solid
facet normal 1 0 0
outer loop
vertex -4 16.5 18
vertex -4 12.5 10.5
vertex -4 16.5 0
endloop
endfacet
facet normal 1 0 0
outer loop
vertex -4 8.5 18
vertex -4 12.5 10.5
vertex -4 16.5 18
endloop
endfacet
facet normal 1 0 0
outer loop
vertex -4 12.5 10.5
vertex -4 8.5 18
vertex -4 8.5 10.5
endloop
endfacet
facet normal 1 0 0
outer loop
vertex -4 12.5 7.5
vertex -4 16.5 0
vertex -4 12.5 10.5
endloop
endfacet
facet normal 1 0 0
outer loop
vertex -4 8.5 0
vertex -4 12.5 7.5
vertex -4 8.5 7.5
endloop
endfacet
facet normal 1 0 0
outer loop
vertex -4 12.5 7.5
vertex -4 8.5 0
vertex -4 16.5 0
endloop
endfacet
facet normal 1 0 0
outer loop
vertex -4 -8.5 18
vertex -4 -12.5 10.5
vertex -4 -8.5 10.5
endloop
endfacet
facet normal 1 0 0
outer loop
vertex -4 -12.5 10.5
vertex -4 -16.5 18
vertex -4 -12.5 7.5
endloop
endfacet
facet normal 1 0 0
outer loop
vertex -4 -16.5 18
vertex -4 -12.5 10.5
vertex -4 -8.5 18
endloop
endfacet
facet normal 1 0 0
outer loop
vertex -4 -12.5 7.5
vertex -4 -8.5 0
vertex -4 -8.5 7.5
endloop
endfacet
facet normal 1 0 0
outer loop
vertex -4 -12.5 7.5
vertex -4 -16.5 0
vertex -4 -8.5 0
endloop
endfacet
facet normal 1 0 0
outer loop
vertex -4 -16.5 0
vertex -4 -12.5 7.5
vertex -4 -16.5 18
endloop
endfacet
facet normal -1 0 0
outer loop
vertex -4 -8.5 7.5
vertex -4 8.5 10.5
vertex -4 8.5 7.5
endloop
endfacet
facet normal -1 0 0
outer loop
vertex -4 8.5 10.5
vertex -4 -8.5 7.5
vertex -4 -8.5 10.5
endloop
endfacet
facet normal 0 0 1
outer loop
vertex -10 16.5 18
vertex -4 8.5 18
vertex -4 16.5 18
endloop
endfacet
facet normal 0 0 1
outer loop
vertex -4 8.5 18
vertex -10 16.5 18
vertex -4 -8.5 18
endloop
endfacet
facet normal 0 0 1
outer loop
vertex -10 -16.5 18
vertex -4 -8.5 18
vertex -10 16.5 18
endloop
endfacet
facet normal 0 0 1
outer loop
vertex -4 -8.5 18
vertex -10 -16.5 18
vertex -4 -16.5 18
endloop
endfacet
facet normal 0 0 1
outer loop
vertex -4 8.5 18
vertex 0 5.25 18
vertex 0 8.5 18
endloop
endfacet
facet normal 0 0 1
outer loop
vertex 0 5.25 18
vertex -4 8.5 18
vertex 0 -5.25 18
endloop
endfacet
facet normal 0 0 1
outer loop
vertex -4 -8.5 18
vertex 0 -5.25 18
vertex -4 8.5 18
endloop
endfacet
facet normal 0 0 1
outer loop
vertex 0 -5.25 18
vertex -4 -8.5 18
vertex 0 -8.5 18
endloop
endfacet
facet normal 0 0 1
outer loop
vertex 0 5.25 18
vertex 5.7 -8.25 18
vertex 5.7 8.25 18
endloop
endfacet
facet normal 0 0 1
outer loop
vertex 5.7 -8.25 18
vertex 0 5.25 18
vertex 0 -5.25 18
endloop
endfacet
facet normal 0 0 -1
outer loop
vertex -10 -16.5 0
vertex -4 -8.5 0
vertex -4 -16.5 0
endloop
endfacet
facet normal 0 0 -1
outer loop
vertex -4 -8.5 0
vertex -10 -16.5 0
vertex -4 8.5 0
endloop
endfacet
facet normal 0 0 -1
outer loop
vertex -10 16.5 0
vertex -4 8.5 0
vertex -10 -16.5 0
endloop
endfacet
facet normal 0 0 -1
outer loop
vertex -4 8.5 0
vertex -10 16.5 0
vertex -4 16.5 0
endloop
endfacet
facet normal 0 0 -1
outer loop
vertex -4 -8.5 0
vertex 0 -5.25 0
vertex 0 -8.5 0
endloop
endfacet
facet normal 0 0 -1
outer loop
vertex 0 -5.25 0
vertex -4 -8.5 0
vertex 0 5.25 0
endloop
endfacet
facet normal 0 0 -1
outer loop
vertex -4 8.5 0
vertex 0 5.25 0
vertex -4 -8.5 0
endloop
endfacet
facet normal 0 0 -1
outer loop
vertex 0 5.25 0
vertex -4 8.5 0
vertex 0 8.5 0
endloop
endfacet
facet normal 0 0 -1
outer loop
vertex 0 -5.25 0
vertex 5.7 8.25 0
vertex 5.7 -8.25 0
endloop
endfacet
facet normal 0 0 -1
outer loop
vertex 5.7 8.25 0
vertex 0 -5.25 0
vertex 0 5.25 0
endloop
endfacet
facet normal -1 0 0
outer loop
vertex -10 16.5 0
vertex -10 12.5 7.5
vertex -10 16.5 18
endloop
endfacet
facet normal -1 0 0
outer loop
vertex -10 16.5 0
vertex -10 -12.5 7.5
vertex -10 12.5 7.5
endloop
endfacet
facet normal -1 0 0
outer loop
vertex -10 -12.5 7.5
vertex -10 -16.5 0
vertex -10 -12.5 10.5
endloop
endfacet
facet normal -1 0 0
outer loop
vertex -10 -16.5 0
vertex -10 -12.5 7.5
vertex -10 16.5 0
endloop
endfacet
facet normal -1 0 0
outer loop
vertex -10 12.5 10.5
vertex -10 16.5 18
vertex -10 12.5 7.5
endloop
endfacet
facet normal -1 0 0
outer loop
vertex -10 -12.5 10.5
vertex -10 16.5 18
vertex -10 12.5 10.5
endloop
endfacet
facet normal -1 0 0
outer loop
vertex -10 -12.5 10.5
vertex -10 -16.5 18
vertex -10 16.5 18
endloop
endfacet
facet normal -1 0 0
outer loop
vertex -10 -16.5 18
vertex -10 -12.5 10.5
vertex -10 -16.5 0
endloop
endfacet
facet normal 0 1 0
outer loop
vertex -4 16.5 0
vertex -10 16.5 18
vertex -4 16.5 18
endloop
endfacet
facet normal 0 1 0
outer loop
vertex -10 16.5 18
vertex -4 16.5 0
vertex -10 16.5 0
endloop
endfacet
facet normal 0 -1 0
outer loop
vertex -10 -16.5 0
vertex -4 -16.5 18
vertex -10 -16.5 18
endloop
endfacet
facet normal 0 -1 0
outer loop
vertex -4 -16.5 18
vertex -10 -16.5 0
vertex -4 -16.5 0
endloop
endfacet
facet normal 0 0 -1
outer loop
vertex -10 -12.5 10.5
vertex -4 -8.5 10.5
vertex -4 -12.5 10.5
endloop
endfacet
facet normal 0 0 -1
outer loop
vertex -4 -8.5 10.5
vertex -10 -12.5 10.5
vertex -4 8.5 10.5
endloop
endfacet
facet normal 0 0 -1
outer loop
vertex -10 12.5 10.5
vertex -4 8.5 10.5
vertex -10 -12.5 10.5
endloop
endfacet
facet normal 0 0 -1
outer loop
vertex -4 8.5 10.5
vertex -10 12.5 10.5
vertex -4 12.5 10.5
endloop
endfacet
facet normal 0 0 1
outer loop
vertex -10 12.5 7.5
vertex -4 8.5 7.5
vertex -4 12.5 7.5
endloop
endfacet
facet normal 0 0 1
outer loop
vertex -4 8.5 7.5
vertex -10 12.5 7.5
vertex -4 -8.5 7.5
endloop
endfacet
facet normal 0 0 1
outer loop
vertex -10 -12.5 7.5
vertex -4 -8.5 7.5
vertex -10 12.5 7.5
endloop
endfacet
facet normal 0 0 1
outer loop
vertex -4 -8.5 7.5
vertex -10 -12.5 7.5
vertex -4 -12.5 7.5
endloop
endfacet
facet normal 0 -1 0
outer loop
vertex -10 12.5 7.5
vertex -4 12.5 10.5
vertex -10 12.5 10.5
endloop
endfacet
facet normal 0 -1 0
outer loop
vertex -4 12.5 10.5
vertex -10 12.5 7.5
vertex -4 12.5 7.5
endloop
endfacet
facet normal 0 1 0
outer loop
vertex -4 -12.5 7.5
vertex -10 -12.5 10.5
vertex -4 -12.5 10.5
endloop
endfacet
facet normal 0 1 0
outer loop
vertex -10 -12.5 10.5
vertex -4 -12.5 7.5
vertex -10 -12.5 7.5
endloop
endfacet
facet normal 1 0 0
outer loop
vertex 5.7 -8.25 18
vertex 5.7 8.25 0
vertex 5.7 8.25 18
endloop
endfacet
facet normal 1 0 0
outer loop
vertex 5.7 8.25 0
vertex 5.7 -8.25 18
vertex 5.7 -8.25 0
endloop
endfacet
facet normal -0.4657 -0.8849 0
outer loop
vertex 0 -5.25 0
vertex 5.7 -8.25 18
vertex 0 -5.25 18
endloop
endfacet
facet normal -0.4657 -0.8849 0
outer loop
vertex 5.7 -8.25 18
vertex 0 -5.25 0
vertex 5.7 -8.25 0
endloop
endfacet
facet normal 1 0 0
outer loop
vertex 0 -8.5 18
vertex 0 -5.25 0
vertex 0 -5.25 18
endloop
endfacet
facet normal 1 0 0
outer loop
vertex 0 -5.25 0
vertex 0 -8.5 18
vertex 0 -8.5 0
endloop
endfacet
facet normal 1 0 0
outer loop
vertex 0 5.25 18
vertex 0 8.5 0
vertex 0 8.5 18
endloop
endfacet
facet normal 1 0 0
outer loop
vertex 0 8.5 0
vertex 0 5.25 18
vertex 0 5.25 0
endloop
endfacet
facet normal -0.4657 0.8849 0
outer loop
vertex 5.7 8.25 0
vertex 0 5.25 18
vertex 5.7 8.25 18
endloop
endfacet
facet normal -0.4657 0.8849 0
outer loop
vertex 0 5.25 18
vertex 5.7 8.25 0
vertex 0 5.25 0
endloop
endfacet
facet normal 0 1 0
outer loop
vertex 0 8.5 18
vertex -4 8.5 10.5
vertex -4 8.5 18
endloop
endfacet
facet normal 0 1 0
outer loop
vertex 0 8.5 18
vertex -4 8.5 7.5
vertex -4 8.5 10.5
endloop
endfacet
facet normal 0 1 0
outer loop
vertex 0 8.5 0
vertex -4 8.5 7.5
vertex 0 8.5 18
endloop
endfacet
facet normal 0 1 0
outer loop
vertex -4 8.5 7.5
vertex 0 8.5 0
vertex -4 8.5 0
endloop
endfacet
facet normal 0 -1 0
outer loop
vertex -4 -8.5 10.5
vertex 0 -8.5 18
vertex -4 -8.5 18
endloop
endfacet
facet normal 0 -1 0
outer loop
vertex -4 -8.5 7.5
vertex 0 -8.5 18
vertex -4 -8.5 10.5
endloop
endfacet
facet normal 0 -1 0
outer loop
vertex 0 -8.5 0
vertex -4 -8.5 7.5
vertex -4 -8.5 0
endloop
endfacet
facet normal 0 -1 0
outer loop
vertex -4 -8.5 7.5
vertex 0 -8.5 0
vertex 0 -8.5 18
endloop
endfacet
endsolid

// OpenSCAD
// file: stand_cable_clamp_common.scad
// stand_cable_clamp_common.scad — modular cable clamp for round stand poles.
//
// A split C-clamp pops over the pole and an M5 bolt + wingnut cinches it tight
// (the bolt head is captured in a hex pocket, so you only turn the wingnut —
// tool-free reposition). A dovetail on the clamp face takes slide-on cable
// heads, so one clamp accepts any attachment.
//
//   clamp(tube_d)   — the pole clamp (set tube_d to your pole OD)
//   head_hook()     — open J-hook
//   head_clip()     — snap cable clip
//   head_comb()     — multi-cable comb
//   head_velcro()   — velcro-strap slot
//
// On-Stage SS8800B+ upper shaft = 34.9 mm (1⅜") or 38.1 mm (1½" w/ sleeve).
// Measure the crank-up column for a wider variant.

TUBE_D = 35;        // pole outer diameter (set per stand)
CLEAR  = 0.6;       // clamp bore clearance
WALL   = 5;         // clamp wall
H      = 22;        // clamp height (along the pole)
GAP    = 4;         // split-gap width
EAR_L  = 18; EAR_W = 10;
BOLT_D = 5.4;       // M5 clearance
HEX_AF = 8.2;       // M5 hex head/nut across-flats (capture pocket)
HEX_T  = 4.5;

// dovetail (undercut: mouth narrower than back so the head can't pull out)
DT_MOUTH = 11; DT_BACK = 17; DT_DEPTH = 6; DT_H = 18; DT_STOP = 3; DT_CLEAR = 0.5;
CABLE_D = 8;        // nominal cable diameter for clip/comb

$fn = 64;

// dovetail solid: mouth (narrow) at x=0 facing -X, widening to back at x=depth, extruded up Z
module dt_prism(mouth, back, depth, h) {
    linear_extrude(h) polygon([[0, -mouth/2], [0, mouth/2], [depth, back/2], [depth, -back/2]]);
}
module dt_tongue() { dt_prism(DT_MOUTH - DT_CLEAR, DT_BACK - DT_CLEAR, DT_DEPTH - 0.3, DT_H); }

// ---- clamp ----
module clamp(tube_d = TUBE_D) {
    ir = tube_d / 2 + CLEAR; orr = ir + WALL;
    boss_x = -orr - DT_DEPTH - 2;        // -X outer face of the dovetail boss
    difference() {
        union() {
            cylinder(h = H, r = orr);
            translate([orr - 3, GAP / 2, 0]) cube([EAR_L, EAR_W, H]);            // +Y ear
            translate([orr - 3, -GAP / 2 - EAR_W, 0]) cube([EAR_L, EAR_W, H]);   // -Y ear
            translate([boss_x, -(DT_BACK / 2 + 4), 0]) cube([DT_DEPTH + 5, DT_BACK + 8, H]); // dovetail boss
        }
        translate([0, 0, 0]) cylinder(h = 3 * H, r = ir, center = true);         // bore
        translate([0, -GAP / 2, -1]) cube([orr + EAR_L + 5, GAP, H + 2]);        // split slot
        // wingnut bolt through the ears (along Y)
        translate([orr + EAR_L - 8, GAP / 2 + EAR_W + 3, H / 2]) rotate([90, 0, 0]) cylinder(h = 2 * EAR_W + GAP + 8, d = BOLT_D);
        // hex pocket captures the bolt head on the +Y ear outer face
        translate([orr + EAR_L - 8, GAP / 2 + EAR_W + HEX_T, H / 2]) rotate([90, 0, 0]) cylinder(h = HEX_T + 1, d = HEX_AF / cos(30), $fn = 6);
        // dovetail socket groove (open top, solid below DT_STOP as a slide stop)
        translate([boss_x, 0, DT_STOP]) dt_prism(DT_MOUTH, DT_BACK, DT_DEPTH, H);
    }
}

// ---- heads (universal; mount via the dovetail tongue at x=0..DT_DEPTH) ----
module _backplate(t = 4) { translate([-t, -DT_BACK / 2, 0]) cube([t, DT_BACK, DT_H]); }

module head_hook() {
    dt_tongue(); _backplate();
    translate([-4, 0, DT_H / 2]) rotate([90, 0, 0])
        rotate_extrude(angle = 250) translate([16, 0]) circle(d = 7);
}
module head_clip(clip_w = 12) {
    dt_tongue(); _backplate();
    // C-clip (vertical cable), ring connects to the backplate on +X, mouth opens -X
    ring_out = CABLE_D + 5;
    translate([-4 - ring_out / 2 + 1.5, 0, (DT_H - clip_w) / 2])
        linear_extrude(clip_w) difference() {
            circle(d = ring_out);
            circle(d = CABLE_D + 0.7);
            translate([-ring_out, -(CABLE_D - 1.5) / 2]) square([ring_out, CABLE_D - 1.5]); // snap mouth (-X)
        }
}
module head_comb(n = 4) {
    dt_tongue(); _backplate();
    bar_w = n * (CABLE_D + 3) + 3;
    translate([-4 - 8, -bar_w / 2, 0]) difference() {
        cube([10, bar_w, DT_H]);
        for (i = [0 : n - 1]) translate([-1, 3 + i * (CABLE_D + 3) + CABLE_D / 2, DT_H]) rotate([0, 90, 0]) cylinder(d = CABLE_D, h = 12); // open-top slots
        for (i = [0 : n - 1]) translate([-1, 3 + i * (CABLE_D + 3) + CABLE_D / 2, DT_H - CABLE_D / 2]) cube([12, CABLE_D, CABLE_D]);
    }
}
module head_velcro(strap_w = 25, strap_t = 3) {
    dt_tongue(); _backplate();
    translate([-4 - 6, -(strap_w + 8) / 2, 0]) difference() {
        cube([6, strap_w + 8, DT_H]);
        translate([-1, 4, DT_H / 2 - strap_t / 2]) cube([8, strap_w, strap_t]); // strap thru-slot
    }
}
// main file
// head_velcro — slide-on cable head (universal dovetail mount).
include <stand_cable_clamp_common.scad>
head_velcro();
